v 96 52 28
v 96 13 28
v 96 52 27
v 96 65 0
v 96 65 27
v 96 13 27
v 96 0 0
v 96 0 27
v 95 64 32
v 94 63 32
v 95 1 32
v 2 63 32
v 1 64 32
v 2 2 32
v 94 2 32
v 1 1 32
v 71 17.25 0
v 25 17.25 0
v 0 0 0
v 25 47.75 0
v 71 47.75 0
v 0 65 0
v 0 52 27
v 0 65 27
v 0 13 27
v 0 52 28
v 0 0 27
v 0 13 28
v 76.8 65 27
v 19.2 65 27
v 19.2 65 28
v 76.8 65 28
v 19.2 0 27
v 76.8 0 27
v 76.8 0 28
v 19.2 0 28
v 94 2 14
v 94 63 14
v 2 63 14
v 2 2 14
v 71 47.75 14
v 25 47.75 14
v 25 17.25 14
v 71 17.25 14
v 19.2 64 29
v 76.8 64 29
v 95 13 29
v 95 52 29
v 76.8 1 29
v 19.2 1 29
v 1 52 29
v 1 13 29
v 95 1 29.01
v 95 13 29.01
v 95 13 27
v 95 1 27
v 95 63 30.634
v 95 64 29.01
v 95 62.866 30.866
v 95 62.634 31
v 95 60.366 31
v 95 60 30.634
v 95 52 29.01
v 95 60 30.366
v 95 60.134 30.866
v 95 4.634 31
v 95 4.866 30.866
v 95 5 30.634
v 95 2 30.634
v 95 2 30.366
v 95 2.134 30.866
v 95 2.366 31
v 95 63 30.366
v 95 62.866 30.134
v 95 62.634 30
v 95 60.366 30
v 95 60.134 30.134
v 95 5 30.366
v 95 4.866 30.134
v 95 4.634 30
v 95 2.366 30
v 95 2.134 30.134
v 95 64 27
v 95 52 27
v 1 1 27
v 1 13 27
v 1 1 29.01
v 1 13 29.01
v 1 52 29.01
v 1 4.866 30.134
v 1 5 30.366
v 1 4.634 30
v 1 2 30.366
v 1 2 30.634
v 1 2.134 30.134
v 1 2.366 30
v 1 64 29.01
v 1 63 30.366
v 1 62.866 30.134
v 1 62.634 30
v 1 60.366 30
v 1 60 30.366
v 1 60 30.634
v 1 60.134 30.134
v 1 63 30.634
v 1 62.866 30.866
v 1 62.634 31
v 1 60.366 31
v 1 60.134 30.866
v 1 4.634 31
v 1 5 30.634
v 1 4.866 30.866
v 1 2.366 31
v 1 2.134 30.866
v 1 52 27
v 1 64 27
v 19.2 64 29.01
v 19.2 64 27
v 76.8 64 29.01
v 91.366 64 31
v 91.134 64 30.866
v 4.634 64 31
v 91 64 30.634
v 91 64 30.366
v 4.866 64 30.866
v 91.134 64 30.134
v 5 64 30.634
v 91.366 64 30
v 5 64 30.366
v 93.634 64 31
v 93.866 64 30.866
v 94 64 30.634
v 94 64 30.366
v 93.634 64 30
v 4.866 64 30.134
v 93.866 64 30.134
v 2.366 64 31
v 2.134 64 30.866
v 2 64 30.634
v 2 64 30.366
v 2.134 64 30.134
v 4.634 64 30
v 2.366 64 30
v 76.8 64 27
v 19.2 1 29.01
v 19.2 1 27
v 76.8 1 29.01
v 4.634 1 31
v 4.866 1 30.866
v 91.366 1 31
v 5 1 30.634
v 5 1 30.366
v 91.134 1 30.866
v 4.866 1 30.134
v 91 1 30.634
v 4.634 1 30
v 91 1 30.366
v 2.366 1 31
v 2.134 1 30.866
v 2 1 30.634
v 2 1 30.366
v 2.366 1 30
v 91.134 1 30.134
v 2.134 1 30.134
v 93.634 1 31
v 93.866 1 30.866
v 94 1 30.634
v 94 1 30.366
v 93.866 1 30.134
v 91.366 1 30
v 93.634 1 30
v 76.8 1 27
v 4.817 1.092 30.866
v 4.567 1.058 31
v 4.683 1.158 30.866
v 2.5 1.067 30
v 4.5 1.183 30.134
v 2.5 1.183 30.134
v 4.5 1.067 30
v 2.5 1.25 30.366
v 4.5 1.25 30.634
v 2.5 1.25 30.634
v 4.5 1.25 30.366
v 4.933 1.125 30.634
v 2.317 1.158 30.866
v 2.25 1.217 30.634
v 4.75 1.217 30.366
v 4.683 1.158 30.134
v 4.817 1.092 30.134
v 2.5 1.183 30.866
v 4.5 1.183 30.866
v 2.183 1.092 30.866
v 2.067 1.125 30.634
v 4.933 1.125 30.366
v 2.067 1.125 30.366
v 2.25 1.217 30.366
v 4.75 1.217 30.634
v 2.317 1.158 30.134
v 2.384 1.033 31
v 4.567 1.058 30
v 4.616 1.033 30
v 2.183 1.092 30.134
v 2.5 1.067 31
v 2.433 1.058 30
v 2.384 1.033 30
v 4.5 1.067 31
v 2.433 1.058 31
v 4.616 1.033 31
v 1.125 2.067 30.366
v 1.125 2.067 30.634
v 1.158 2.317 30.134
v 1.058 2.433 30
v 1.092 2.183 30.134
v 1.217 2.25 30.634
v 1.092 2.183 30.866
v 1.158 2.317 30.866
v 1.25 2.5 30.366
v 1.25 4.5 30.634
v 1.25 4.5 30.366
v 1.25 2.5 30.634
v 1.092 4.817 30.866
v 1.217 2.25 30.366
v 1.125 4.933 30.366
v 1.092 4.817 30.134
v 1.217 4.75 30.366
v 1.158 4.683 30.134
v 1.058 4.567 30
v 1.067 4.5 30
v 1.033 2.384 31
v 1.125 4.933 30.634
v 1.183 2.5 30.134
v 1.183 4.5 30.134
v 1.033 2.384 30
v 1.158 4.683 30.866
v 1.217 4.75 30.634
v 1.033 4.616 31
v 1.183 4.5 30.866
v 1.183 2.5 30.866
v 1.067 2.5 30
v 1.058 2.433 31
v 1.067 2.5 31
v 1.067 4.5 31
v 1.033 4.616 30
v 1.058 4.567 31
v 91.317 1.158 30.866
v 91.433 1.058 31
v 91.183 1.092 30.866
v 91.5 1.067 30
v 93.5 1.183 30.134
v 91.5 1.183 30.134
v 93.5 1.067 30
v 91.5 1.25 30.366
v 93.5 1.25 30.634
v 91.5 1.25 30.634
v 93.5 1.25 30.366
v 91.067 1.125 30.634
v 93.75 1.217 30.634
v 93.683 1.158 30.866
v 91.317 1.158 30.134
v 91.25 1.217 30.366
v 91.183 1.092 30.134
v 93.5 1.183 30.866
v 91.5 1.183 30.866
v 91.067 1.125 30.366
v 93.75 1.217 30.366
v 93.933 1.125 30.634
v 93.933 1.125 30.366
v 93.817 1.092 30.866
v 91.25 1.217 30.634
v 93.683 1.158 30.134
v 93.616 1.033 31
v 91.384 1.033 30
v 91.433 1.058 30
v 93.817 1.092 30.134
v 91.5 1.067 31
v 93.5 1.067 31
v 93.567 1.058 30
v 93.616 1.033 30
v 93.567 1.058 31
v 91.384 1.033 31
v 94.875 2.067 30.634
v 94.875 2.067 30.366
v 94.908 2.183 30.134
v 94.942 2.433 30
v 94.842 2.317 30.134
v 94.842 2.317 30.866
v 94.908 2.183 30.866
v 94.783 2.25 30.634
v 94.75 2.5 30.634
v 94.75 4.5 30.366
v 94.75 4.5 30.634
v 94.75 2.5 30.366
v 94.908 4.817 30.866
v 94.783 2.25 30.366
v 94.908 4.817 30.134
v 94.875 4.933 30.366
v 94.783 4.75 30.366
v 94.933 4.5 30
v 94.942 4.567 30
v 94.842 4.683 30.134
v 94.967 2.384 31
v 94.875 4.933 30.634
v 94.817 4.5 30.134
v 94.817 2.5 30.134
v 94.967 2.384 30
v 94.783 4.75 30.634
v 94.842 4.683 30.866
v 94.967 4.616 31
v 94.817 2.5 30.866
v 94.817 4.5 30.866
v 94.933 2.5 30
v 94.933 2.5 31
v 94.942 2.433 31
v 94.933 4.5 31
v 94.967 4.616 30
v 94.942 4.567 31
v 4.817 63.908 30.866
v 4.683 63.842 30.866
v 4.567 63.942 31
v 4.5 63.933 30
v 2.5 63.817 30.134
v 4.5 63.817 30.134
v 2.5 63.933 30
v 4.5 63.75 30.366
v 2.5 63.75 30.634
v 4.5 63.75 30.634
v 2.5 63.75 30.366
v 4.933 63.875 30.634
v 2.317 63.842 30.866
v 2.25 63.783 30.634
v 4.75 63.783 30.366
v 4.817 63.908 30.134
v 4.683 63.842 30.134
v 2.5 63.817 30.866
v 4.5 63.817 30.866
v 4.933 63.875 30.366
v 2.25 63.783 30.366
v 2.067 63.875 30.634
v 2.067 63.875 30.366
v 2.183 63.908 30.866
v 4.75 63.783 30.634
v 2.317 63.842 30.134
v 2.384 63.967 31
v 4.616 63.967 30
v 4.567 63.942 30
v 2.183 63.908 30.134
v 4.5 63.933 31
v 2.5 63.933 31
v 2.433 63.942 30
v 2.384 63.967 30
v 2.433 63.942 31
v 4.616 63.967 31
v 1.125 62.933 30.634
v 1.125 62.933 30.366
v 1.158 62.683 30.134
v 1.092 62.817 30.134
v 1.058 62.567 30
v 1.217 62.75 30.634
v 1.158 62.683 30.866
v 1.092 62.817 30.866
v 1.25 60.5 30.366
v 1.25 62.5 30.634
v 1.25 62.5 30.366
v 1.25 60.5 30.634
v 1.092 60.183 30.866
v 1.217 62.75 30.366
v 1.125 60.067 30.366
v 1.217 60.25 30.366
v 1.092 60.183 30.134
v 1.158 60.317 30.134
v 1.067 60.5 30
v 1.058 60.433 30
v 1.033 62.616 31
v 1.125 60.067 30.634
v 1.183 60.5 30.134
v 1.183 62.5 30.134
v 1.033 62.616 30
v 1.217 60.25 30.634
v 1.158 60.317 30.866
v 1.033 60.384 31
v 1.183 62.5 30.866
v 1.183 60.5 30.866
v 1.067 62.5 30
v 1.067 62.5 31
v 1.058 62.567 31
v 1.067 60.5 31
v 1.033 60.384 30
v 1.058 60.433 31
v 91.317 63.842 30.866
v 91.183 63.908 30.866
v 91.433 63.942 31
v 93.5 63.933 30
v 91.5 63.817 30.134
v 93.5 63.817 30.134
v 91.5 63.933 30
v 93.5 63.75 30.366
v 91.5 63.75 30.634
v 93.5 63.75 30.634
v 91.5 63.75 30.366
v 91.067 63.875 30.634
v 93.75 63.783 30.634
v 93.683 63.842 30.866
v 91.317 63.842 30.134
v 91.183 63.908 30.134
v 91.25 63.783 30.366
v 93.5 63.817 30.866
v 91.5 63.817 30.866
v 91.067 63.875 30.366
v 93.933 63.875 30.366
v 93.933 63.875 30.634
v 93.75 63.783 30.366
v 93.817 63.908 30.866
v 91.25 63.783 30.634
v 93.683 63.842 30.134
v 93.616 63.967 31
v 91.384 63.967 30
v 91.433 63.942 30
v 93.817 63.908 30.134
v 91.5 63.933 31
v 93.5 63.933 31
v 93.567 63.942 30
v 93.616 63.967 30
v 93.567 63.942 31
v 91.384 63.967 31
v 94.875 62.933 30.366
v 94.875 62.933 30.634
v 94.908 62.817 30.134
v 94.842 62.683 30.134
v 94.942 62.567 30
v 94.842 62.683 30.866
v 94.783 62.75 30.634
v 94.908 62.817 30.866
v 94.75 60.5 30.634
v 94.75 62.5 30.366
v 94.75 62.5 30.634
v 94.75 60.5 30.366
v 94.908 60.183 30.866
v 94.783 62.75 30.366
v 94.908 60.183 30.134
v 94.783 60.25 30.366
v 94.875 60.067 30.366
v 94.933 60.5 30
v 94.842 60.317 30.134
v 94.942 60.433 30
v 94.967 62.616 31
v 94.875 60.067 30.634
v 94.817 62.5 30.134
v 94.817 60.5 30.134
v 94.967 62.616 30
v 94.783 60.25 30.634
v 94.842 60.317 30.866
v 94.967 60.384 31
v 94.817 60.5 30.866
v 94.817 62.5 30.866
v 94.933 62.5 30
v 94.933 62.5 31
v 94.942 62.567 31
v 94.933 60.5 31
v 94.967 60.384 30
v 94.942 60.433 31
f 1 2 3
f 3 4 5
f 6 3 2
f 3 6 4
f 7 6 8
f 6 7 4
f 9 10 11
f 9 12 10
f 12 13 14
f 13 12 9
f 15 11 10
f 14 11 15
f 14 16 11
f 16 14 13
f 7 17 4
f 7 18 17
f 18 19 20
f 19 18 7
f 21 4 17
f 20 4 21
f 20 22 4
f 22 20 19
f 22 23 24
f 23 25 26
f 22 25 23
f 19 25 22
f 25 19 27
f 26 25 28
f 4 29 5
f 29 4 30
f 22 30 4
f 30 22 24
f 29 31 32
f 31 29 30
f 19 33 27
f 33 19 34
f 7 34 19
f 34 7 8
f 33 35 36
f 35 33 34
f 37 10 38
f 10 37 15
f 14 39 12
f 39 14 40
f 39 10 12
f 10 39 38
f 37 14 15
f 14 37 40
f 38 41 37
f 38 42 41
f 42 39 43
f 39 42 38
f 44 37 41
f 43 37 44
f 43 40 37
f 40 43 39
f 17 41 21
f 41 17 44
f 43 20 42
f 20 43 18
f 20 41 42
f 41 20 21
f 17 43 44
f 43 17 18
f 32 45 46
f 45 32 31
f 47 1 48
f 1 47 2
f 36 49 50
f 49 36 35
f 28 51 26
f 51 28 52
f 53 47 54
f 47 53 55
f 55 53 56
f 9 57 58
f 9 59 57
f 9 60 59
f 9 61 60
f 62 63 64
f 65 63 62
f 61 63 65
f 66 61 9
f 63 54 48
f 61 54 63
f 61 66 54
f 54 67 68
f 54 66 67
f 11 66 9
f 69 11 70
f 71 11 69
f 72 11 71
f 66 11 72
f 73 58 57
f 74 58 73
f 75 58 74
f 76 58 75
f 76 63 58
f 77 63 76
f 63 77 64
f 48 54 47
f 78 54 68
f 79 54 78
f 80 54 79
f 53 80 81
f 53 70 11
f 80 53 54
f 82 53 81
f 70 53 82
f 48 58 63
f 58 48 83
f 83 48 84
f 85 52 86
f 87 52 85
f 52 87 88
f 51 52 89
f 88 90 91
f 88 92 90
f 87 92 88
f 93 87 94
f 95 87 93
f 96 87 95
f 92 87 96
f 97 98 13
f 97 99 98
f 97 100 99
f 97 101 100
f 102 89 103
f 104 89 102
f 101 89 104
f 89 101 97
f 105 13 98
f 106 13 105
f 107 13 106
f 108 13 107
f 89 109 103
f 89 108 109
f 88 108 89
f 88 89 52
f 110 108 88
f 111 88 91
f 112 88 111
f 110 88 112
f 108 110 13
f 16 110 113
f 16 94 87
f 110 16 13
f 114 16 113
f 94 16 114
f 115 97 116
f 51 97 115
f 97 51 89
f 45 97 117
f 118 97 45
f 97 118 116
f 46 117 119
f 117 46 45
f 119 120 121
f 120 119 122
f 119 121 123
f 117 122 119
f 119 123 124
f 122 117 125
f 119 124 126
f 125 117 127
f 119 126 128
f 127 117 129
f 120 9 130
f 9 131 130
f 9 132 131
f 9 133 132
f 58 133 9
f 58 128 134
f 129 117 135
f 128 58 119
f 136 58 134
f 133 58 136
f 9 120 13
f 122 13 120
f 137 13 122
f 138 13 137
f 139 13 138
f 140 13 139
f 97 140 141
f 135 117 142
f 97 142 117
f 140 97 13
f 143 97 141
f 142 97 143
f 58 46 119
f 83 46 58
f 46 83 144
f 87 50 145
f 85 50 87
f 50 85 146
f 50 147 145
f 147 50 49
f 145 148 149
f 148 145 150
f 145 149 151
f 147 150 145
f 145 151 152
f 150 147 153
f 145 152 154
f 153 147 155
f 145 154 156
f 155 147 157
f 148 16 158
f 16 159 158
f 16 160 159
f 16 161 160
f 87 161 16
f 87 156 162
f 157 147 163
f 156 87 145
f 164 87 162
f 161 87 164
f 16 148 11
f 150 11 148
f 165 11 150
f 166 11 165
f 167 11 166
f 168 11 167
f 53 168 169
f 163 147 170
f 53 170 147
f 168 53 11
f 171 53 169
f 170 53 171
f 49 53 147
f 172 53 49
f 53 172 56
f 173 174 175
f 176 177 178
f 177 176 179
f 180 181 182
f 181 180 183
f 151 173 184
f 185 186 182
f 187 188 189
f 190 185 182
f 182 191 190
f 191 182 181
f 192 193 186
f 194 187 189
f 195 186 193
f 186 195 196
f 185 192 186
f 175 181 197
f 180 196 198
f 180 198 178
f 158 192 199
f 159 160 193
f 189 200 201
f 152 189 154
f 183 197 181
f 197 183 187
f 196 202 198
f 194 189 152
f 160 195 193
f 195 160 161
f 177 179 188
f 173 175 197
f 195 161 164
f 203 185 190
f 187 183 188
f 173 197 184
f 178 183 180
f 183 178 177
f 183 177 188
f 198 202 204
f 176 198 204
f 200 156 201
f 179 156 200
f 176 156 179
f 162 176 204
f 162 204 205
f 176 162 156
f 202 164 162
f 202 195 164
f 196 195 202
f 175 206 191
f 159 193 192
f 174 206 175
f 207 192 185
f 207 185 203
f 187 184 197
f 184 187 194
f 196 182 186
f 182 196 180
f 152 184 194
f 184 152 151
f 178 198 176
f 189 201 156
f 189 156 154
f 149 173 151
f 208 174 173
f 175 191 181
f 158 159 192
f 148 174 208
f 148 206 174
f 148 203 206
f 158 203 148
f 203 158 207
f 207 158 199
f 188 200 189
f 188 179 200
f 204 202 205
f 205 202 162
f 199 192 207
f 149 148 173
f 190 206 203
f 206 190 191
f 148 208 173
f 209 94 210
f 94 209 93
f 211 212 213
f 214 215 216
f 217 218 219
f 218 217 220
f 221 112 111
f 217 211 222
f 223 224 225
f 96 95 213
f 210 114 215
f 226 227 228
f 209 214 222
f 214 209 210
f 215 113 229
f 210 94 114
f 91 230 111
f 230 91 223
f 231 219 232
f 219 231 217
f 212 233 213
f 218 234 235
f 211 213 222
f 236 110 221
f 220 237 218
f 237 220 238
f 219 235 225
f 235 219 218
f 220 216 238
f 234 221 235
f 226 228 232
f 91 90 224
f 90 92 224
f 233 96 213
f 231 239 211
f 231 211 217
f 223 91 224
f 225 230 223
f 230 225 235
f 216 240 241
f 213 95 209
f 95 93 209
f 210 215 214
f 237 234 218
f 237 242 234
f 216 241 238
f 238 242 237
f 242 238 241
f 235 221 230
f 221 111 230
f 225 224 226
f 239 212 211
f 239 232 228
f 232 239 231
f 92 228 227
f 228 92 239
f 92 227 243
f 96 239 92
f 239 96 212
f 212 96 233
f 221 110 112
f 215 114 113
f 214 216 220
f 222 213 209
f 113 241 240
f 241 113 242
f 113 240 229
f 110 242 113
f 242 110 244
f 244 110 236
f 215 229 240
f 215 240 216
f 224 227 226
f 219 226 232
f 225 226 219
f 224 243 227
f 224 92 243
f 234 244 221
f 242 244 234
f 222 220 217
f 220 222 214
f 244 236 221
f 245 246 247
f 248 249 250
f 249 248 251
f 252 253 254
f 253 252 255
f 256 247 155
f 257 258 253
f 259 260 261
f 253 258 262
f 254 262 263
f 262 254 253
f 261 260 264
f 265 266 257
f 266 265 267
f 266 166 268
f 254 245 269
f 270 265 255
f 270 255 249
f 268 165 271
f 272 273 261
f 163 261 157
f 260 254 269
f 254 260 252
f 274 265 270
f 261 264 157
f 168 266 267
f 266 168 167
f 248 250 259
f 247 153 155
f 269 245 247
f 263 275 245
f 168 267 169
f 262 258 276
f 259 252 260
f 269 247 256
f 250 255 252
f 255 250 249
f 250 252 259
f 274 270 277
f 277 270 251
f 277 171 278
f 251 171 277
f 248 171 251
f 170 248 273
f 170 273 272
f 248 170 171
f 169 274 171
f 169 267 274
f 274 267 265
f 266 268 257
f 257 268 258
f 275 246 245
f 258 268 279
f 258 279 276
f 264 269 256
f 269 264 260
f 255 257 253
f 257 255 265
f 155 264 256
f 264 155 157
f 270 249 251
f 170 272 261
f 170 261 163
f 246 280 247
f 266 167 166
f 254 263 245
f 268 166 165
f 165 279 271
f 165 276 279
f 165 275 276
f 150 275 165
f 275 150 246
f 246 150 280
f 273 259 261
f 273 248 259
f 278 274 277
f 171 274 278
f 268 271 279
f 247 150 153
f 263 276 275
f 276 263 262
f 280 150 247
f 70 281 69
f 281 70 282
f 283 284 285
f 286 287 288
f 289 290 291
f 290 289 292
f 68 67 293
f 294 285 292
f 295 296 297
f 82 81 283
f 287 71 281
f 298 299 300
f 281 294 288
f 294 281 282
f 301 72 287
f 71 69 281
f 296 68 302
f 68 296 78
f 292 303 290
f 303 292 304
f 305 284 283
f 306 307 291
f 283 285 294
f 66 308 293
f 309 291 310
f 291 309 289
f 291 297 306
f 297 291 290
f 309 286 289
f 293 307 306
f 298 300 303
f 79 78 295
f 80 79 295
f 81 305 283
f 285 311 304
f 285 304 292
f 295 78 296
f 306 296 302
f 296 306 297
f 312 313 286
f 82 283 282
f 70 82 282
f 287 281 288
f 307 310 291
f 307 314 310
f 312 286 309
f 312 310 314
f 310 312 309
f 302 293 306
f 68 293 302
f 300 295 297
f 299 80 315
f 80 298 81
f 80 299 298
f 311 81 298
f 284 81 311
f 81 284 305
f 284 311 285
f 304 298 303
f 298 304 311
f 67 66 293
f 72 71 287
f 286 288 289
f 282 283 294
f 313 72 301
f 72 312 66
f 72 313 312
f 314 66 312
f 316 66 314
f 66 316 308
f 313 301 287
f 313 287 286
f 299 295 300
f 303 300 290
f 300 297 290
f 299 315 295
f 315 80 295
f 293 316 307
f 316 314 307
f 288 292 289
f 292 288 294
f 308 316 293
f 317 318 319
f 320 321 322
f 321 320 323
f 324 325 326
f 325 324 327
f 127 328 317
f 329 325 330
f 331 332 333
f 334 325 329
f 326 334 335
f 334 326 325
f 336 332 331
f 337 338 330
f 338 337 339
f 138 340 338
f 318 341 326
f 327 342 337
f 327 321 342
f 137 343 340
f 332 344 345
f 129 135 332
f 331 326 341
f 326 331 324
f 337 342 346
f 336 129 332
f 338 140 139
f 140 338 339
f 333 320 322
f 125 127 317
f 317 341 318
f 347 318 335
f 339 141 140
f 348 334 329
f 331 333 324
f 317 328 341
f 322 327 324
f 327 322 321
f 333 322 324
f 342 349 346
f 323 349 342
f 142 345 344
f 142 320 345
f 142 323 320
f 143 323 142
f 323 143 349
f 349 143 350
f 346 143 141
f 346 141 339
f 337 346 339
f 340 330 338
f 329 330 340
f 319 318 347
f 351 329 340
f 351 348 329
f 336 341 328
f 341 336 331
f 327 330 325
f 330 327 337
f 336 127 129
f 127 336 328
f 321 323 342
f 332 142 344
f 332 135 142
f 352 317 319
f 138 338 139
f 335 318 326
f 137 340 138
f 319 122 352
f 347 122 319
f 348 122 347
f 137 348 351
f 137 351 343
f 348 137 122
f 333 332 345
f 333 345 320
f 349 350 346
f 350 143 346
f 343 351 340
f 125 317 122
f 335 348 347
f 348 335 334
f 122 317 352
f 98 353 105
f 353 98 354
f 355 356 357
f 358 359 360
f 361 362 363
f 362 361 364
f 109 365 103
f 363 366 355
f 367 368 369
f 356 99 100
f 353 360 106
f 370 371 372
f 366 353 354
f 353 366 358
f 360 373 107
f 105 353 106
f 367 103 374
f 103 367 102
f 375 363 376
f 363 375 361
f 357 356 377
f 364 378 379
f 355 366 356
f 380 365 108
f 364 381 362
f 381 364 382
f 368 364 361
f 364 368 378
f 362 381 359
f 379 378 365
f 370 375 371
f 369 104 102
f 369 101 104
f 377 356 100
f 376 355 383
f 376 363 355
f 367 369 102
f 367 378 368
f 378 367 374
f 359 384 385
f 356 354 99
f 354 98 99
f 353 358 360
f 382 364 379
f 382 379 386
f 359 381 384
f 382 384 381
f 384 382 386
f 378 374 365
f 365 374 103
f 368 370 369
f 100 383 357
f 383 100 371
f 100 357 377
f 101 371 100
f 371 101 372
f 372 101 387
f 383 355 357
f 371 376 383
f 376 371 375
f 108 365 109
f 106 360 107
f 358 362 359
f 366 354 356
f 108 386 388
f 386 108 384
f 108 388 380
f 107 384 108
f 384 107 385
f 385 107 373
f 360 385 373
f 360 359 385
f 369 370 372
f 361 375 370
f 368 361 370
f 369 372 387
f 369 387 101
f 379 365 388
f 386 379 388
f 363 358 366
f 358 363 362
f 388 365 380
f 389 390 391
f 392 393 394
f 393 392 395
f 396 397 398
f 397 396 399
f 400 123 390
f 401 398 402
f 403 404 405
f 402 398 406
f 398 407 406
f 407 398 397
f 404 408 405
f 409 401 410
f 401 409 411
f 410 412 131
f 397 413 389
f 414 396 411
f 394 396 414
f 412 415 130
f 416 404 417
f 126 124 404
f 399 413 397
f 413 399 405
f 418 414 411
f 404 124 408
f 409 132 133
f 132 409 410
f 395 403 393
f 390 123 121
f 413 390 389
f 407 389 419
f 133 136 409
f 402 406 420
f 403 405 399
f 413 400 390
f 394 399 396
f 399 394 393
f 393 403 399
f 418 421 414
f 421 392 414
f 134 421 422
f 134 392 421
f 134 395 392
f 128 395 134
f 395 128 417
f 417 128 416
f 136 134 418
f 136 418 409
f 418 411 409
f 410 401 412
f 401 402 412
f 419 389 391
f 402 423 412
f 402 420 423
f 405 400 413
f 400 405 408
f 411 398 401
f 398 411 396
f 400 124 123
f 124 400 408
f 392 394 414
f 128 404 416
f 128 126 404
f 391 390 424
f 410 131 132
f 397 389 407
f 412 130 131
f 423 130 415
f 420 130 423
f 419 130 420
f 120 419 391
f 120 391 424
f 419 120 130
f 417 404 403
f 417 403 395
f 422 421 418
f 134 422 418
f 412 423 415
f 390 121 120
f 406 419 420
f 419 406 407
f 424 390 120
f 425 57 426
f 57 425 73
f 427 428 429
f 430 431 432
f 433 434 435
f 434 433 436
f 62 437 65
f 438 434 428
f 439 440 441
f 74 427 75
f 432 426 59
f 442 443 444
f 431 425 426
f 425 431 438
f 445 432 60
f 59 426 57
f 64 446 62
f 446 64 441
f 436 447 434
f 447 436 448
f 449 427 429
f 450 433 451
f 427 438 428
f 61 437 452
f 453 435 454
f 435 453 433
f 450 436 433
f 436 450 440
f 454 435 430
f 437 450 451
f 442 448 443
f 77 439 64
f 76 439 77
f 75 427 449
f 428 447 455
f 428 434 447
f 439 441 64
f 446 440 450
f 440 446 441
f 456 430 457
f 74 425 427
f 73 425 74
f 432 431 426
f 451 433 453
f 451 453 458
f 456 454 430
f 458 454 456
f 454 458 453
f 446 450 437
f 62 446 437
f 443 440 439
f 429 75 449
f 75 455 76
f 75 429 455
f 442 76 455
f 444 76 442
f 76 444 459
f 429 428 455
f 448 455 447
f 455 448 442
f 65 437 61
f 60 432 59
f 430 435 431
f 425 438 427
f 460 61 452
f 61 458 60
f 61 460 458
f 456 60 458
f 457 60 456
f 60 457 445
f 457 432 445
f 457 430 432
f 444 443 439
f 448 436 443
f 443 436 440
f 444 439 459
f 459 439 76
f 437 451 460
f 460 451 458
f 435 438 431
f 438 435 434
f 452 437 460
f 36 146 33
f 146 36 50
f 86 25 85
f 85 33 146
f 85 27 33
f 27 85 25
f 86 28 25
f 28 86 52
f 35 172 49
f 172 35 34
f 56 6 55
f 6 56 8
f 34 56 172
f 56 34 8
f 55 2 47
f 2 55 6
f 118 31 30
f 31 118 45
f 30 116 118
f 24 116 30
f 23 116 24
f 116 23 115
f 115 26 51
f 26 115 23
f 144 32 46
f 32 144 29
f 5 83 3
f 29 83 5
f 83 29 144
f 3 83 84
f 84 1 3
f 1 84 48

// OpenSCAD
insert_font = "Libre Baskerville:style=Regular";

include <../../The-Boardgame-Insert-Toolkit/boardgame_insert_toolkit_lib.2.scad>;
include <../../BFD-Insert-Extensions/InsertExtensions.scad>;



g_b_print_lid = false;
g_b_print_box = true; 
g_wall_thickness = 2.0;
g_lid_thickness = 2.0;
g_min_bottom_thickness = 1.0;

// The tolerance value is extra space put between planes of the lid and box that fit together.
// Increase the tolerance to loosen the fit and decrease it to tighten it.
//
// Note that the tolerance is applied exclusively to the lid.
// So if the lid is too tight or too loose, change this value ( up for looser fit, down for tighter fit ) and 
// you only need to reprint the lid.
// 
// The exception is the stackable box, where the bottom of the box is the lid of the box below,
// in which case the tolerance also affects that box bottom.
//
g_tolerance = 0.15;

// This adjusts the position of the lid detents downward. 
// The larger the value, the bigger the gap between the lid and the box.
g_tolerance_detents_pos = 0.1;
card_sizes = [[61,92]];
card_width = 61;
card_height = 92;

playerBoxSizes = [[92,61,13]];
playerBoxPositions = [[0,0]];
function playerBox() = freeFormBox3( "Player Box",playerBoxPositions,playerBoxSizes, 96,65, 15,cutout_bottom=[t,f],bottom_cutout_pct = 50,label_data=[""],lid_patt_radius=5,shape=SQUARE);

function heatBox() = freeFormBox3( "Heat Box",playerBoxPositions,playerBoxSizes, 96,65, 15,cutout_bottom=[t,f],bottom_cutout_pct = 50,label_data=["Heat"],lid_patt_radius=5,shape=SQUARE);

function stressBox() = freeFormBox3( "Stress Box",playerBoxPositions,playerBoxSizes, 96,65, 15,cutout_bottom=[t,f],bottom_cutout_pct = 50,label_data=["Stress"],lid_patt_radius=5,shape=SQUARE);

upgradeBoxSizes = [[92,61,30],[92,61,30]];
upgradeBoxPositions = [[0,0],[0,65]];
function upgradeBox() = freeFormBox3( "Upgrade Box",upgradeBoxPositions,upgradeBoxSizes, 96,65+65, 15+15+2,cutout_bottom=[t,t],bottom_cutout_pct = 50,label_data=["Upgrades"],label_size=15,label_rotation=90,lid_patt_radius=5,shape=SQUARE);

gearShiftBoxSizes = [[15.5,15.5,26],[15.5,15.5,26],[15.5,15.5,26],[15.5,15.5,26],[15.5,15.5,26],[15.5,15.5,26],[15.5,15.5,26],[15.5,15.5,26],[(15.5*2)+1,(15.5*4)+(1*3),10]];
gearShiftBoxPositions = [[0,0],[0,(15.5*1)+(1*1)],[0,(15.5*2)+(1*2)],[0,(15.5*3)+(1*3)],[16.5,0],[16.5,(15.5*1)+(1*1)],[16.5,(15.5*2)+(1*2)],[16.5,(15.5*3)+(1*3)],[0,0]];
gearShiftBoxShapes=[ROUND,ROUND,ROUND,ROUND,ROUND,ROUND,ROUND,ROUND,SQUARE];
function gearShiftBox() = freeFormBox4( "Gear Shift Box",gearShiftBoxPositions,gearShiftBoxSizes, (15.5*2)+(1*1)+4,(15.5*4)+(1*3)+4, 32,bottom_cutout_pct = 50,label_data=["Gear Shifts"],label_size=7,label_rotation=90,lid_patt_radius=5,shapes=gearShiftBoxShapes,rotate_shape=t);

function carBox() = gridBox( "Car Box", [2,4], ["Cars"], 12, 90, 32, 17, 9,padding = [1,1]);

//function mapHolder() = cornerHolder("Map Holder",[100,100,58],[13,13],39);

function scorePads() = gridBox( "Score Pads", [1,1], ["Score Pads"], 10, 90, 65, 102, 17,padding = [1,1],cutout=t);

upgradeweatherRoadBoxSizes = [[80,61,13],[29,61,13]];
weatherRoadBoxPositions = [[0,2],[81,2]];
function weatherRoadBox() = freeFormBox3( "Weather Road Box",weatherRoadBoxPositions,upgradeweatherRoadBoxSizes, 114,69,19,cutout_bottom=[t,t],bottom_cutout_pct = 50,label_data=["Weather and","Road Conditions"],label_size=8,label_rotation=0,lid_patt_radius=5,shape=SQUARE);

sponsorshipBoxSizes = [[92,61,25]];
sponsorshipBoxPositions = [[0,0]];
function sponsorshipBox() = freeFormBox3( "Sponsorship Box",sponsorshipBoxPositions,sponsorshipBoxSizes, 96,65, 32,cutout_bottom=[t,f],bottom_cutout_pct = 50,label_data=["Sponsorships"],lid_patt_radius=5,shape=SQUARE,label_size=9);

otherBoxSizes = [[92,61,18]];
otherBoxPositions = [[0,0]];
function otherBox() = freeFormBox3( "Other Box",otherBoxPositions,otherBoxSizes, 96,65, 32,cutout_bottom=[t,f],bottom_cutout_pct = 50,label_data=["Tracks","Events","Legends"],lid_patt_radius=5,shape=SQUARE,label_size=8);

borderWidth = [8,8];
holderSize = [285,285,61];
mapSize = [265,265,52];
//function mapHolder() = freeFormBox4("Map Holder",
//[borderWidth],[[mapSize[0],mapSize[1],mapSize[2]]], holderSize[0], holderSize[1],holderSize[2],
//cutout_sides=[[t,t,t,t]],side_cutout_height_pct=100,cutout_bottom=[t],bottom_cutout_pct = 50,side_cutout_width_pct=50,lid=false);

function trackHolder() = mapHolder("Track Holder",holderSize,mapSize,borderWidth);

pressBoxSizes = [[66,52,9]];
pressBoxPositions = [[0,6.5]];
function pressCornerBox() = freeFormBox3( "Press Corner Box",pressBoxPositions,pressBoxSizes, 70,69, 11,cutout_bottom=[f,f],bottom_cutout_pct = 50,label_data=["Press Corner"],lid_patt_radius=5,shape=SQUARE,label_size=7);

function spacer1() = spacer("Spacer 1",24,144,34);
function spacer2() = spacer("Spacer 2",32,69,34);
function spacer3() = spacer("Spacer 3",75,69,13);


g_isolated_print_box = "Other Box"; 
 
 data = [
    playerBox(),
    upgradeBox(),
    gearShiftBox(),
    carBox(),
    trackHolder(),
    scorePads(),
    heatBox(),
    stressBox(),
    sponsorshipBox(),
    weatherRoadBox(),
    spacer1(),
    spacer2(),
    otherBox(),
    spacer3(),
    pressCornerBox(),
 ];
 

 
MakeAll();
 
 
